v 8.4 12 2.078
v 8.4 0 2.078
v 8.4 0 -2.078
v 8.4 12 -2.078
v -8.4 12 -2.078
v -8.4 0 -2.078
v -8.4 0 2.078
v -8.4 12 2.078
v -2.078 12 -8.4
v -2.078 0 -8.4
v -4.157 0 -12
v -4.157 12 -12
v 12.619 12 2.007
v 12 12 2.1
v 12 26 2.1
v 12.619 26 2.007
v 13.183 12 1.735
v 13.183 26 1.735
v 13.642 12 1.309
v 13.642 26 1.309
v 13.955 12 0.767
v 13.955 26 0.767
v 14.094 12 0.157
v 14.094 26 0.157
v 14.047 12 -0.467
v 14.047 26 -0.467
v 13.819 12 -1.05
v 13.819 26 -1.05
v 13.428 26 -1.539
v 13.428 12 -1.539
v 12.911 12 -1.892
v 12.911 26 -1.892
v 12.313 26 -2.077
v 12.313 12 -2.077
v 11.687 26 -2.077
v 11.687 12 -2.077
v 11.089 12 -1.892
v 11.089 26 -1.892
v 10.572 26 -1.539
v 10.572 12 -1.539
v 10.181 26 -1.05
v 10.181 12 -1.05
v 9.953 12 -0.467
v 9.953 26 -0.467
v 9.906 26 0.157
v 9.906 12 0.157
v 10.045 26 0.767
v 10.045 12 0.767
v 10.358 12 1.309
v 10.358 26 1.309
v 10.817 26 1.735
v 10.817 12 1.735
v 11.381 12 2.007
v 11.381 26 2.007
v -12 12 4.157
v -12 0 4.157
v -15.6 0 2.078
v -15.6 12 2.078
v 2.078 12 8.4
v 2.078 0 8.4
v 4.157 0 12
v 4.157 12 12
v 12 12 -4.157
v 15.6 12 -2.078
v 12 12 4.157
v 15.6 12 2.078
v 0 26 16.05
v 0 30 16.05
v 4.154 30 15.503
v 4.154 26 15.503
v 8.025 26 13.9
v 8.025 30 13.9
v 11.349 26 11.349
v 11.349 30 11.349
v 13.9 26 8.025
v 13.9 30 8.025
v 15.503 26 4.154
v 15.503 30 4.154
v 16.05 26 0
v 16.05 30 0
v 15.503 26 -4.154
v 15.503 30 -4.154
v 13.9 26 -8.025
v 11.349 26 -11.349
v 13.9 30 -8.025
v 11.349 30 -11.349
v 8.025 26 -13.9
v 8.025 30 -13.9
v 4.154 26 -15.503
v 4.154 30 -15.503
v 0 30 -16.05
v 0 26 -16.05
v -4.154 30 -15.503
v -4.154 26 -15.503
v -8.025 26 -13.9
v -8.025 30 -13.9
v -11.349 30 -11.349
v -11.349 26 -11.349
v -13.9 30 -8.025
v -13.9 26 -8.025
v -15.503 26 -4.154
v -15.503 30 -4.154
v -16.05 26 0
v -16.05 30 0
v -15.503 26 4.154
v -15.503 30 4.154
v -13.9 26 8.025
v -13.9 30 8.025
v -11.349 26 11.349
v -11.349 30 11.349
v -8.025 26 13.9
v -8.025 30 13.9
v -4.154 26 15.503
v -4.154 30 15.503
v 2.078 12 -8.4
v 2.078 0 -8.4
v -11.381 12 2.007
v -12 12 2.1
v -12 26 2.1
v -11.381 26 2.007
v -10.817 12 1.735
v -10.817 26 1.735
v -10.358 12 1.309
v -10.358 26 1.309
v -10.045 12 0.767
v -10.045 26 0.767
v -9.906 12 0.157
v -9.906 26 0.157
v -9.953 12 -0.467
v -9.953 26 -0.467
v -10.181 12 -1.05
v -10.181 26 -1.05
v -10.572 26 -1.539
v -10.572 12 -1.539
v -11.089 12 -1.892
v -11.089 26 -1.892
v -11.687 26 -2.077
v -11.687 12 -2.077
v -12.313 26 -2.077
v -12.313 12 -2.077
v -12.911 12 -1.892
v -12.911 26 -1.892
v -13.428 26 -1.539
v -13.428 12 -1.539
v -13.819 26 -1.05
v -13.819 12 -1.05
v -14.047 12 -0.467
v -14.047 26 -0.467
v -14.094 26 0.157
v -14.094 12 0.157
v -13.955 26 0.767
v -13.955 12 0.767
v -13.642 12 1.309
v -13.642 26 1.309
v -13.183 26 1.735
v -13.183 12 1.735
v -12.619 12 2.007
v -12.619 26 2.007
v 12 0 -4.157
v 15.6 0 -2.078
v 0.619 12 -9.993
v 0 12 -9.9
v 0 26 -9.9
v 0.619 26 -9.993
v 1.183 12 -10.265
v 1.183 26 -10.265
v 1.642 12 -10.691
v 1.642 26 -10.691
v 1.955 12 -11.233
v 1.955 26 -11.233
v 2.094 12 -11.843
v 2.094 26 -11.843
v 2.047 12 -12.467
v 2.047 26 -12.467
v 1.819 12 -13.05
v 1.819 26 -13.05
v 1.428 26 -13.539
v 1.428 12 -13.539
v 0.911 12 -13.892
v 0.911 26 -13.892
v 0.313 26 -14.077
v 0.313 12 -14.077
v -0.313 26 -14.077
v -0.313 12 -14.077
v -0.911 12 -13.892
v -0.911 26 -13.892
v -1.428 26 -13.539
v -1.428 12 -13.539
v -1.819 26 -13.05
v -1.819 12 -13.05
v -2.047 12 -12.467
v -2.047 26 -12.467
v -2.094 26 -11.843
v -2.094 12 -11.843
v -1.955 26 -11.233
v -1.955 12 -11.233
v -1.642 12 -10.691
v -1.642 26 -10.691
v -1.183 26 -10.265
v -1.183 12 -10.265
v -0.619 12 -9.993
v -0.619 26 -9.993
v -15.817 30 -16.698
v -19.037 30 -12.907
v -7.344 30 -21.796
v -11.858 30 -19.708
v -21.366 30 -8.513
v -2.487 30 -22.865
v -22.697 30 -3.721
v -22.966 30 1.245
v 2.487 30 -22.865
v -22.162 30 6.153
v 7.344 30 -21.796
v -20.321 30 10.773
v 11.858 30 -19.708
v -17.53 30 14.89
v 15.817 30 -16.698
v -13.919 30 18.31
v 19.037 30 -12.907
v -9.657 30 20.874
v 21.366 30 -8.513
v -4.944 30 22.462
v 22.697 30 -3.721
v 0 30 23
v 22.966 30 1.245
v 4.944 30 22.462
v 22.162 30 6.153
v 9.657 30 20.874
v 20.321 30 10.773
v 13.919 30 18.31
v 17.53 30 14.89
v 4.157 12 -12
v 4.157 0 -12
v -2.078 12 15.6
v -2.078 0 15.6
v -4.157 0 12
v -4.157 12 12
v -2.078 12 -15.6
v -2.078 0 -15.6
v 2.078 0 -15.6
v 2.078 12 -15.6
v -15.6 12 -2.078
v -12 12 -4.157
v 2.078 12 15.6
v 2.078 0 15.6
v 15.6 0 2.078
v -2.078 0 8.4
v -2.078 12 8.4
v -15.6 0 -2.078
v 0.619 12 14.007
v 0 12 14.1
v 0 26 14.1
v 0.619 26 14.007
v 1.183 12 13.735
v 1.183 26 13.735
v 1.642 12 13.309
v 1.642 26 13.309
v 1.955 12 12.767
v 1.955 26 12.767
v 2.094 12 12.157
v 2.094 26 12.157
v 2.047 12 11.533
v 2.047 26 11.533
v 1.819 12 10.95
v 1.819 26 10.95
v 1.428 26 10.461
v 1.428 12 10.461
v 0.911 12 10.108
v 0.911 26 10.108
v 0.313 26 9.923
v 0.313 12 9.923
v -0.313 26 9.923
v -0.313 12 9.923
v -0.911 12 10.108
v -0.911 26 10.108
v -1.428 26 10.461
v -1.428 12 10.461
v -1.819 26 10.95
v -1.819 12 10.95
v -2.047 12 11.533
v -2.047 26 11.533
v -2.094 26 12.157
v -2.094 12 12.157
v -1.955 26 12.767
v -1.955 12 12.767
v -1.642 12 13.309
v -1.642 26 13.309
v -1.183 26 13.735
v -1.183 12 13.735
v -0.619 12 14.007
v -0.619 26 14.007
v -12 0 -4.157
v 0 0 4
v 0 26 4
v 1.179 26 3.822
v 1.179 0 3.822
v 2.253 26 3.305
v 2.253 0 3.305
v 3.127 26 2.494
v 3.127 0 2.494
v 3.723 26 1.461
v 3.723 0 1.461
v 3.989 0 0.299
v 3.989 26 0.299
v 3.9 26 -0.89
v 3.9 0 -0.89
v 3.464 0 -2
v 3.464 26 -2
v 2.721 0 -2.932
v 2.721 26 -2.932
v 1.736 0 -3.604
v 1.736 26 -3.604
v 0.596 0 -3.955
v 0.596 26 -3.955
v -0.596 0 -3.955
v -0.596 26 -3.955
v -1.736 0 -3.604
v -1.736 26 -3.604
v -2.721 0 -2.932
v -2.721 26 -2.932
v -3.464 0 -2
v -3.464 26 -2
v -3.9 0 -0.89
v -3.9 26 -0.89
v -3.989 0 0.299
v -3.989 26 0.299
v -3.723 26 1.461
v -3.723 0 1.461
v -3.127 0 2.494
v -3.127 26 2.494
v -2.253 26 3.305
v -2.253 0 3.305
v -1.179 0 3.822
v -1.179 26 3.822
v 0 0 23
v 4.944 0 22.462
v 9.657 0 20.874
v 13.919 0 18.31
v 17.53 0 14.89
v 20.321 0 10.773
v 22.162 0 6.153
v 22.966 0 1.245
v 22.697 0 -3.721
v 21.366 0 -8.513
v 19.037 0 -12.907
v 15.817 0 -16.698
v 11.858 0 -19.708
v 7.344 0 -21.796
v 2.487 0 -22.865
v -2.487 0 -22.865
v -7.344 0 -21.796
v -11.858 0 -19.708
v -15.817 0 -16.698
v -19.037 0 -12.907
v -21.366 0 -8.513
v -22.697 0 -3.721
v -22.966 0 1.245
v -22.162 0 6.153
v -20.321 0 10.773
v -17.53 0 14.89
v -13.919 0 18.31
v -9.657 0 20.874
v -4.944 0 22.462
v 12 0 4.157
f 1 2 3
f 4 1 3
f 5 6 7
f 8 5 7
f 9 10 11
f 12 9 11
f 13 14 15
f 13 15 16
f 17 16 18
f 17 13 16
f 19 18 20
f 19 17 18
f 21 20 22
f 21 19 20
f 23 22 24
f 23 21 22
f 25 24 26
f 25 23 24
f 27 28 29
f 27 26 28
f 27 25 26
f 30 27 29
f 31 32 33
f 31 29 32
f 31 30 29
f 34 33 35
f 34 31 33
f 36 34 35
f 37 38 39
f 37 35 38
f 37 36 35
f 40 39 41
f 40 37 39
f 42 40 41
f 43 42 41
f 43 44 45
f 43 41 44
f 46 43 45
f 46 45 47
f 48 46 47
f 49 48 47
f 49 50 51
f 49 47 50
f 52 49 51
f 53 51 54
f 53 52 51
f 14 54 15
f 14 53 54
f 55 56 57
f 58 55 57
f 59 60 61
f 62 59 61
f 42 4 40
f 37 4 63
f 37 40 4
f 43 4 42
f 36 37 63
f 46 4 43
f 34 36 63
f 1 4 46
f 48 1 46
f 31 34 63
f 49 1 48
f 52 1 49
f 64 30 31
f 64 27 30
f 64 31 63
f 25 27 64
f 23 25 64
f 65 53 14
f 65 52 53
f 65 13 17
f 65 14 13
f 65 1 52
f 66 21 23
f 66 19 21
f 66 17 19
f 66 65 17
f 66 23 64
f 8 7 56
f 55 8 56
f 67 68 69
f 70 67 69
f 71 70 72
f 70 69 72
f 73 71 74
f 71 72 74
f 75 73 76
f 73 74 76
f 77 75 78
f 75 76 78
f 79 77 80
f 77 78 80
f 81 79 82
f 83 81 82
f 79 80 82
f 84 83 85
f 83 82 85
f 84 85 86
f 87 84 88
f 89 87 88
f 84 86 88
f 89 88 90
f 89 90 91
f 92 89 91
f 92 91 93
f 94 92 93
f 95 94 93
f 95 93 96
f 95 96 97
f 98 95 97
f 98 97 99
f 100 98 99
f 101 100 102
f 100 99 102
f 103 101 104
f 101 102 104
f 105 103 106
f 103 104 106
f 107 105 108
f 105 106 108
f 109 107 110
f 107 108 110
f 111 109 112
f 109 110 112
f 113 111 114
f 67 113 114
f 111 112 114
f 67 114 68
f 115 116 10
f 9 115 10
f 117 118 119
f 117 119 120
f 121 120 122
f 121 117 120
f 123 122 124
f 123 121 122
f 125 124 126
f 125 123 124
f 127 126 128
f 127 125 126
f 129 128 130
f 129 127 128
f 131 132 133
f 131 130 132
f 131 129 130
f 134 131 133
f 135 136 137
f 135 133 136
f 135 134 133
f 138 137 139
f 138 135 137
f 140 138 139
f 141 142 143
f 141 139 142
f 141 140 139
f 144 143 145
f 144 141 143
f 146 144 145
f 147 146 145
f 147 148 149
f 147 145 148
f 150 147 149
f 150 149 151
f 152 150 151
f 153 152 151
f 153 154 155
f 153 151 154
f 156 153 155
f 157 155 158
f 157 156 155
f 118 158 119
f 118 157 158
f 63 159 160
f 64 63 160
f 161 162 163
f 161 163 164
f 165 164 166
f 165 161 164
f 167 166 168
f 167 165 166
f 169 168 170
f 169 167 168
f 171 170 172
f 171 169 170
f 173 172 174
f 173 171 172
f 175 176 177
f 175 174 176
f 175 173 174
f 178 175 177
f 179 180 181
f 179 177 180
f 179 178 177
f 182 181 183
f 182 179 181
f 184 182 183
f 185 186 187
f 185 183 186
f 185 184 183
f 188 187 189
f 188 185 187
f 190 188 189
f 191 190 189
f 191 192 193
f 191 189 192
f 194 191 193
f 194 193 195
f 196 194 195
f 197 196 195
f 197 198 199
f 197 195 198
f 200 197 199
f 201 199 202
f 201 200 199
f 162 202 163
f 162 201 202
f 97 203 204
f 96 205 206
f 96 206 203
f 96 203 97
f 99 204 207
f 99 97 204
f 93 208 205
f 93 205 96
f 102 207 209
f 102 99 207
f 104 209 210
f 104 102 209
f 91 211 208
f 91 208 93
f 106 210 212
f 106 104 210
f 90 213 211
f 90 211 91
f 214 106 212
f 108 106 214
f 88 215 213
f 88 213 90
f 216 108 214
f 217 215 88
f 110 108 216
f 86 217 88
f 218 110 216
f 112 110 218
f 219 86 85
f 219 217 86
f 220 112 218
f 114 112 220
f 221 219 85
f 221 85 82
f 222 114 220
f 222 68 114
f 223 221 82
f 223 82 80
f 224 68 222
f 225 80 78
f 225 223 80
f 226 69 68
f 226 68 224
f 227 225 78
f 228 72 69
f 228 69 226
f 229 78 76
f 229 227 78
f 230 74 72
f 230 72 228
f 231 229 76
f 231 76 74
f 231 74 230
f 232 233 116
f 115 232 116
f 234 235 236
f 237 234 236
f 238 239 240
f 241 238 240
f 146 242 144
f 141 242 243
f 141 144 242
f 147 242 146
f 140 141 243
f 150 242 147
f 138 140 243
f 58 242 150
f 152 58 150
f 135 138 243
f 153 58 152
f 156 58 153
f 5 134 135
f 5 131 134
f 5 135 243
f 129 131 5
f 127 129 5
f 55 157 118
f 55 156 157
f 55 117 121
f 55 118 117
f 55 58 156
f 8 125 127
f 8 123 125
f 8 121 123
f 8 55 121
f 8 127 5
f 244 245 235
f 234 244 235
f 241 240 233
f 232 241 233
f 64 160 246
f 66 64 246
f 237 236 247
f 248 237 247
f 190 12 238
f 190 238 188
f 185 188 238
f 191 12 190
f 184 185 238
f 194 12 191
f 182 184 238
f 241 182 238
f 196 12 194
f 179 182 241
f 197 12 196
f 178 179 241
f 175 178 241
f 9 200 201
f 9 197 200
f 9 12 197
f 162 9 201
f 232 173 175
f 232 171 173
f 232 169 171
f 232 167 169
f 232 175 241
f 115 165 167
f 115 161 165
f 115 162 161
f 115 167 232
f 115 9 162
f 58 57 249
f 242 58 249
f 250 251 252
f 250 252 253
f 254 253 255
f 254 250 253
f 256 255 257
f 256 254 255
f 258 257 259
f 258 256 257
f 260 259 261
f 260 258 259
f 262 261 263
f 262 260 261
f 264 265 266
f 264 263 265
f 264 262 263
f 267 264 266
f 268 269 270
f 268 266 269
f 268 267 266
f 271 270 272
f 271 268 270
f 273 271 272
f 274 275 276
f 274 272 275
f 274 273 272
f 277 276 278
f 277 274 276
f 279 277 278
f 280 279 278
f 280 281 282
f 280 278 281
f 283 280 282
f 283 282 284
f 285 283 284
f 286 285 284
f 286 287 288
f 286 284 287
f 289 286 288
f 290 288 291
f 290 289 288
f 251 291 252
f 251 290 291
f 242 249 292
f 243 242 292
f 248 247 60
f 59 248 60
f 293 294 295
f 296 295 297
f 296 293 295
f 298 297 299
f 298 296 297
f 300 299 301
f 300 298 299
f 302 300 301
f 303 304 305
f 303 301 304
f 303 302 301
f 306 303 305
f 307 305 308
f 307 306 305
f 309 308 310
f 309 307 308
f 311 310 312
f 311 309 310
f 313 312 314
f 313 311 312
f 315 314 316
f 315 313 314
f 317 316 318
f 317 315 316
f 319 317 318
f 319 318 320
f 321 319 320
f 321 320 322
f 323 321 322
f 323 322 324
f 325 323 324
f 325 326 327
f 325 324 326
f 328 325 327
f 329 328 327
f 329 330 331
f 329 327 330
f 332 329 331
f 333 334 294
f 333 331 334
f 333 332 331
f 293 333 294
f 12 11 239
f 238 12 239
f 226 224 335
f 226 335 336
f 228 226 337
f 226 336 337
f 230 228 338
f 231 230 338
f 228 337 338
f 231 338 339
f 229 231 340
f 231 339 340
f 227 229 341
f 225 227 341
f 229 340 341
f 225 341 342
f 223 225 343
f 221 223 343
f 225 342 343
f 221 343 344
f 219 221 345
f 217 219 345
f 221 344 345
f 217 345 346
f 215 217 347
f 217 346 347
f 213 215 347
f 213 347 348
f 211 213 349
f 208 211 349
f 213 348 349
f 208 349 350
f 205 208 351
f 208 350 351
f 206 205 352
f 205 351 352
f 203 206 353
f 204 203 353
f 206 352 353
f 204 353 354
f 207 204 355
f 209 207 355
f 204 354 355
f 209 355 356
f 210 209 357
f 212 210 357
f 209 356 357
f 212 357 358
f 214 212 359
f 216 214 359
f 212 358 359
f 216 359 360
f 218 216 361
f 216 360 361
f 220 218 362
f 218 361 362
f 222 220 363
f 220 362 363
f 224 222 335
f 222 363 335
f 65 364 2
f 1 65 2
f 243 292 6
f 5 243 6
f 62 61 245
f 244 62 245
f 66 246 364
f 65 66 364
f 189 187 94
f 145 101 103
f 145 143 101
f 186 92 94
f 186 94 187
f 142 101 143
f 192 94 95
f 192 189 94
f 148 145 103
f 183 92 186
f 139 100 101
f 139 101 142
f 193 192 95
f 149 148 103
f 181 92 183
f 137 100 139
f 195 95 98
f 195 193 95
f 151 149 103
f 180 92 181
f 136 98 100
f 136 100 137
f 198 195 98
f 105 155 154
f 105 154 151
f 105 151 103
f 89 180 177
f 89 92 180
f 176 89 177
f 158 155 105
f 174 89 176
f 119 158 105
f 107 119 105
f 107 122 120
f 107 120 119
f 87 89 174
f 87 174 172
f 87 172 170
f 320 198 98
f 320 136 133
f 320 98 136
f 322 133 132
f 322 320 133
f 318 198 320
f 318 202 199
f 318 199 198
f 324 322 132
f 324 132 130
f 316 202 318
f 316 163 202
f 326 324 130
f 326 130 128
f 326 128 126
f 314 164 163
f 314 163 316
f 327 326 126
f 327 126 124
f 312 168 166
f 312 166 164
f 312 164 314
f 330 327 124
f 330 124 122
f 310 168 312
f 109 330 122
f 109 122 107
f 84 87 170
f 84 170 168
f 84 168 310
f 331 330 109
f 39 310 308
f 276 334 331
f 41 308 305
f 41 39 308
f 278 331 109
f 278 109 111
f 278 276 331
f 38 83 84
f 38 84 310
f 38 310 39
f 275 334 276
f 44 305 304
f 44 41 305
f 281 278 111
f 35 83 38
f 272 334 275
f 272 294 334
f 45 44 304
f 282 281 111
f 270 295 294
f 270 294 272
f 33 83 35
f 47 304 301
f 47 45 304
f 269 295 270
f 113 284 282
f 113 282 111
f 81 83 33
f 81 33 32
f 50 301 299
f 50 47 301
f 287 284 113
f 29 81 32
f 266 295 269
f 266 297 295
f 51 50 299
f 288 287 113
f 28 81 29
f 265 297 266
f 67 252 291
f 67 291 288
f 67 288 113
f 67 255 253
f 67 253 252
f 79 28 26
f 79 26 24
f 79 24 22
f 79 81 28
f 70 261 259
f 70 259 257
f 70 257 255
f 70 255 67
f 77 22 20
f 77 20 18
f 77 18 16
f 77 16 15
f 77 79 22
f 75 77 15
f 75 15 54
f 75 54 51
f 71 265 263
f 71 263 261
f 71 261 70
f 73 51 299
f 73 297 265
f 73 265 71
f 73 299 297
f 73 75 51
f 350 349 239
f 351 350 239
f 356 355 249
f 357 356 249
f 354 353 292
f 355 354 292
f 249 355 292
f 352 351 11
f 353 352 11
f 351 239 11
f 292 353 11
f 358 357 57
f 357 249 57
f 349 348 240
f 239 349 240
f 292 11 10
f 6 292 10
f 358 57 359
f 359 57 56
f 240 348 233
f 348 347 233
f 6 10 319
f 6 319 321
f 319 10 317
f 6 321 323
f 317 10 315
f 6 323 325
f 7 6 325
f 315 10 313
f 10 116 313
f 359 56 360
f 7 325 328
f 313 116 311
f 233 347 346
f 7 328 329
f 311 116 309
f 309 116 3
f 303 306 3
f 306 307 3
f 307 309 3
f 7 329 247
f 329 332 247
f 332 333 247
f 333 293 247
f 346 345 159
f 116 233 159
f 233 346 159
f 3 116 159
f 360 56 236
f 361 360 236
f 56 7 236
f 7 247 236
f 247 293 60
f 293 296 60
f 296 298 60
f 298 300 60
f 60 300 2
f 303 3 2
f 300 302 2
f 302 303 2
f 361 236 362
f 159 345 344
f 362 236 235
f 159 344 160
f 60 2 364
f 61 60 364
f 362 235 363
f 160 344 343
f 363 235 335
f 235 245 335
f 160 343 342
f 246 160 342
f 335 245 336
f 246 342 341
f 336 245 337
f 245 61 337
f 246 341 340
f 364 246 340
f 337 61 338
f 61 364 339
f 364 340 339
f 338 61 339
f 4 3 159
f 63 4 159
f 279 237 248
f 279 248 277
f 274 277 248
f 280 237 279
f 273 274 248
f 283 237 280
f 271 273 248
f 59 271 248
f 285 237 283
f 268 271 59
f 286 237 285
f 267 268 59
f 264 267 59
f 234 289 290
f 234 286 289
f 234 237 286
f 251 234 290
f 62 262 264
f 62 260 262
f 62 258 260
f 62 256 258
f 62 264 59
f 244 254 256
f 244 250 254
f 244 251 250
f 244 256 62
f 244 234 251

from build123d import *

# Parameters (mm, degrees)
SKETCH1_R           = 23
SKETCH1_R_2         = 4
SKETCH1_R_3         = 2.1
BOSS_EXTRUDE1_DEPTH = 30
SKETCH2_R           = 16.05
CUT_EXTRUDE1_DEPTH  = 4
CUT_EXTRUDE2_DEPTH  = 12


with BuildPart() as part:
    # Sketch1 → Boss-Extrude1 (new body)
    with BuildSketch(Plane(origin=(0, 0, 0), x_dir=(1, 0, 0), z_dir=(0, 1, 0))):
        with Locations(Location((0, 0, 0), (0, 0, 270))):
            Circle(SKETCH1_R)
        with Locations(Location((0, 0, 0), (0, 0, 270))):
            Circle(SKETCH1_R_2, mode=Mode.SUBTRACT)
        with Locations(Location((0, 12, 0), (0, 0, 270))):
            Circle(SKETCH1_R_3, mode=Mode.SUBTRACT)
        with Locations(Location((12, 0, 0), (0, 0, 270))):
            Circle(SKETCH1_R_3, mode=Mode.SUBTRACT)
        with Locations(Location((0, -12, 0), (0, 0, 270))):
            Circle(SKETCH1_R_3, mode=Mode.SUBTRACT)
        with Locations(Location((-12, 0, 0), (0, 0, 270))):
            Circle(SKETCH1_R_3, mode=Mode.SUBTRACT)
    extrude(amount=BOSS_EXTRUDE1_DEPTH)

    # Sketch2 → Cut-Extrude1 (cut)
    with BuildSketch(Plane(origin=(0, 30, 0), x_dir=(1, 0, 0), z_dir=(0, 1, 0))):
        with Locations(Location((0, 0, 0), (0, 0, 270))):
            Circle(SKETCH2_R)
    extrude(amount=-CUT_EXTRUDE1_DEPTH, mode=Mode.SUBTRACT)

    # Sketch3 → Cut-Extrude2 (cut)
    with BuildSketch(Plane.XZ):
        Polygon((12, -4.156921938), (15.6, -2.078460969), (15.6, 2.078460969), (12, 4.156921938), (8.4, 2.078460969), (8.4, -2.078460969), align=None)
        Polygon((4.156921938, 12), (2.078460969, 15.6), (-2.078460969, 15.6), (-4.156921938, 12), (-2.078460969, 8.4), (2.078460969, 8.4), align=None)
        Polygon((-4.156921938, -12), (-2.078460969, -15.6), (2.078460969, -15.6), (4.156921938, -12), (2.078460969, -8.4), (-2.078460969, -8.4), align=None)
        Polygon((-12, 4.156921938), (-15.6, 2.078460969), (-15.6, -2.078460969), (-12, -4.156921938), (-8.4, -2.078460969), (-8.4, 2.078460969), align=None)
    extrude(amount=-CUT_EXTRUDE2_DEPTH, mode=Mode.SUBTRACT)


solid = part.part
